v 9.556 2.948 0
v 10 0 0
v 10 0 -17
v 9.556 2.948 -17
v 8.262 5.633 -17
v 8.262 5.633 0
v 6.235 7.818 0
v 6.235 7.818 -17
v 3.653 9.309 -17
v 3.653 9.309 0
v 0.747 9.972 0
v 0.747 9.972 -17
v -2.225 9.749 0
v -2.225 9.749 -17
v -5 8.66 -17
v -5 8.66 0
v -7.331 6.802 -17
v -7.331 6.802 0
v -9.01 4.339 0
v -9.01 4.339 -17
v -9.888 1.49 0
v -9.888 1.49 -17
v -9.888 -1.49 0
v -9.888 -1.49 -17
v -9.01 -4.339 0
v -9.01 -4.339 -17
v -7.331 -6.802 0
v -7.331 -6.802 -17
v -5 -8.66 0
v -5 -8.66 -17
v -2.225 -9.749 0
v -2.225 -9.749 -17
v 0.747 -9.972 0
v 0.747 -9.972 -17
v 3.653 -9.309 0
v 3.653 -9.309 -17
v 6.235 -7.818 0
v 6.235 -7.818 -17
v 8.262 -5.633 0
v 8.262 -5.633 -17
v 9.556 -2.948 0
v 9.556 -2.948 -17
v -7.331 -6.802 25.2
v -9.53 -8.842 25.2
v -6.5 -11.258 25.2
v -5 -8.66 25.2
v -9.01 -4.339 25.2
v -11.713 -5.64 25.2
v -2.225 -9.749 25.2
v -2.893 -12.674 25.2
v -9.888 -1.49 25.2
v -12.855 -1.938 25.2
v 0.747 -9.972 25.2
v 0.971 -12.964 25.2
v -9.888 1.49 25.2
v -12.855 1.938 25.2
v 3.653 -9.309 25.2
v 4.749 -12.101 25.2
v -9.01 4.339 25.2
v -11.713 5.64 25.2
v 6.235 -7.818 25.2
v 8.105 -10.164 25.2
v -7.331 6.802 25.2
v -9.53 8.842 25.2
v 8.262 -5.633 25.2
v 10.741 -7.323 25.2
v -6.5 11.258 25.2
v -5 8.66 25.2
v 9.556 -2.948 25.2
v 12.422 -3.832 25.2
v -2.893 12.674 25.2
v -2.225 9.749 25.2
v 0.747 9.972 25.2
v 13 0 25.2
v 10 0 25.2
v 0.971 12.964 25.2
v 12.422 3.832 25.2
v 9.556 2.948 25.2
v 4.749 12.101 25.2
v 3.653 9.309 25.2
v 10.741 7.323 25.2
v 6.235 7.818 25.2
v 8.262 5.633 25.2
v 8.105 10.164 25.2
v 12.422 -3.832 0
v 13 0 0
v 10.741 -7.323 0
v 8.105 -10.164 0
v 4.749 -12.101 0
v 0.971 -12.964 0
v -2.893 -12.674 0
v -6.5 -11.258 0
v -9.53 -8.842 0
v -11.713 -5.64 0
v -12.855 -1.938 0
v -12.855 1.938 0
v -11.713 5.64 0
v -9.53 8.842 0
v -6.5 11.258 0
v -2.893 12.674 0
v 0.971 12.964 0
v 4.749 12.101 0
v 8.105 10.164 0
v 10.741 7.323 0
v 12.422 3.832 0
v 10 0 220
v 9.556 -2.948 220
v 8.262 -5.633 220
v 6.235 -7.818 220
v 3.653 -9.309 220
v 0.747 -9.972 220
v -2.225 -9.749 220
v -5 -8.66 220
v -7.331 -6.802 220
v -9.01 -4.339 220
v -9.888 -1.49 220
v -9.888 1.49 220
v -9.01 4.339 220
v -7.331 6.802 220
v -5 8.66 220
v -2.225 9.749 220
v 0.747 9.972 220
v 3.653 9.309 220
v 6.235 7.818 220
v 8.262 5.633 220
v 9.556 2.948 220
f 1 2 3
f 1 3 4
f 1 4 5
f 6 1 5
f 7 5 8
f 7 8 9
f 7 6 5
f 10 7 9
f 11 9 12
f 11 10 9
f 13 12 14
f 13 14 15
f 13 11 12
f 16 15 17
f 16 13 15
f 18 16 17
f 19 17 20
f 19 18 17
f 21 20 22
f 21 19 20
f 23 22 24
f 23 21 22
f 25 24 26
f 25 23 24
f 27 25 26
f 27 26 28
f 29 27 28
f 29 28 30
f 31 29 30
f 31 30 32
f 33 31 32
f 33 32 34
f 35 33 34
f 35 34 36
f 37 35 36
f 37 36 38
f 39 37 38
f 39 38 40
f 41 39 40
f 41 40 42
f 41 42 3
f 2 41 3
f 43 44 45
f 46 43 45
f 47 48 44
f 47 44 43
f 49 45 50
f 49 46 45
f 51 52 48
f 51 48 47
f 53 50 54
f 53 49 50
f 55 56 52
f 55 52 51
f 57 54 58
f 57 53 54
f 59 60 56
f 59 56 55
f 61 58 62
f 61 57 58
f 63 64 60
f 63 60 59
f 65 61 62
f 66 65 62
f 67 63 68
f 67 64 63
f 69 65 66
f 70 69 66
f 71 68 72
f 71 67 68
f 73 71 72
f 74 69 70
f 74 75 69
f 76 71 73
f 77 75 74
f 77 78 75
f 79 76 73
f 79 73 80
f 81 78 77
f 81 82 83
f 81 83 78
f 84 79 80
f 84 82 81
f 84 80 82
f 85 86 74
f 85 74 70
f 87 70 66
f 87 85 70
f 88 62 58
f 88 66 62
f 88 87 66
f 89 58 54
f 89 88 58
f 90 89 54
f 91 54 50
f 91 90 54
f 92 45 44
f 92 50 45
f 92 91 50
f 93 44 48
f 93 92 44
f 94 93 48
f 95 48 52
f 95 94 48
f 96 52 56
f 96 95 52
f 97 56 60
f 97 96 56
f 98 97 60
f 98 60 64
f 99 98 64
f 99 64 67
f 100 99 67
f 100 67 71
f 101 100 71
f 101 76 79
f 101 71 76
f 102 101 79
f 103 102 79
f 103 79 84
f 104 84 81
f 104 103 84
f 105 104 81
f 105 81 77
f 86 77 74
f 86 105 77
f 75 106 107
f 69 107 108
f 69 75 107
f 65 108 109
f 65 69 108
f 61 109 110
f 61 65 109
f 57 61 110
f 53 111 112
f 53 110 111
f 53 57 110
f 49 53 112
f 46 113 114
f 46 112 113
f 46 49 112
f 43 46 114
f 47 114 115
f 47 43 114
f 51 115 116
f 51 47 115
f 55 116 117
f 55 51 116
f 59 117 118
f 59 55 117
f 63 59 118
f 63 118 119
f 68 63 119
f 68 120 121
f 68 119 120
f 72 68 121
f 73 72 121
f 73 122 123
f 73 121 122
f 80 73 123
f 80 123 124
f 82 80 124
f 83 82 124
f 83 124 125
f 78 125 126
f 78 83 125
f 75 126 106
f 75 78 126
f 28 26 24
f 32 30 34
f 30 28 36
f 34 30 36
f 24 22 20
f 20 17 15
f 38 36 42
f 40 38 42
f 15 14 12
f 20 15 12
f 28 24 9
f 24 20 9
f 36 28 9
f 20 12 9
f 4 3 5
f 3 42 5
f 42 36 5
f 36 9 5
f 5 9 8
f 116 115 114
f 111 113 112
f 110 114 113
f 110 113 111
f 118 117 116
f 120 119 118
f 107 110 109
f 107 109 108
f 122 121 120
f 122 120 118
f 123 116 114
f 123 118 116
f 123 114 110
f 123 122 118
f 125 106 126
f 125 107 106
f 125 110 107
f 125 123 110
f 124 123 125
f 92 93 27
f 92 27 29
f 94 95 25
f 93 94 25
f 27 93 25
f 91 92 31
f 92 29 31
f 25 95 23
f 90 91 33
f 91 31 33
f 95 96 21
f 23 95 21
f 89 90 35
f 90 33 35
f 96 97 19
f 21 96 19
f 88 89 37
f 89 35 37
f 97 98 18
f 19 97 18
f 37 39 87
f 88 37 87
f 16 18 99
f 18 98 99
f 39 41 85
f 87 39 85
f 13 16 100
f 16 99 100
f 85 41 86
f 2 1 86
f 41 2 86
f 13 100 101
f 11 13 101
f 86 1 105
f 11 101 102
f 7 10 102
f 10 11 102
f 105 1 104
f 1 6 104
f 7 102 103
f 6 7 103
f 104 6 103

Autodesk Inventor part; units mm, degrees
ref_plane "YZ Plane" through (0, 0, 0) normal (1, 0, 0) x (0, 1, 0)
ref_plane "XZ Plane" through (0, 0, 0) normal (0, 1, 0) x (-1, 0, 0)
ref_plane "XY Plane" through (0, 0, 0) normal (0, 0, 1) x (1, 0, 0)
sketch "Sketch1" plane through (0, 0, 0) normal (0, 0, 1) x (1, 0, 0)
  circle A0 centre (0, 0) radius 10
  circle A1 centre (0, 0) radius 13
  dimension "d0" = 20
  dimension "d1" = 3
extrude "Extrusion1" add sketch "Sketch1" along normal blind 25.2 contours A0 | A1
extrude "Extrusion2" add sketch "Sketch1" against normal blind 17 contours A0
extrude "Extrusion3" add sketch "Sketch1" along normal blind 220 contours A0
properties part number "Axle1" material "Aluminum 6061"
